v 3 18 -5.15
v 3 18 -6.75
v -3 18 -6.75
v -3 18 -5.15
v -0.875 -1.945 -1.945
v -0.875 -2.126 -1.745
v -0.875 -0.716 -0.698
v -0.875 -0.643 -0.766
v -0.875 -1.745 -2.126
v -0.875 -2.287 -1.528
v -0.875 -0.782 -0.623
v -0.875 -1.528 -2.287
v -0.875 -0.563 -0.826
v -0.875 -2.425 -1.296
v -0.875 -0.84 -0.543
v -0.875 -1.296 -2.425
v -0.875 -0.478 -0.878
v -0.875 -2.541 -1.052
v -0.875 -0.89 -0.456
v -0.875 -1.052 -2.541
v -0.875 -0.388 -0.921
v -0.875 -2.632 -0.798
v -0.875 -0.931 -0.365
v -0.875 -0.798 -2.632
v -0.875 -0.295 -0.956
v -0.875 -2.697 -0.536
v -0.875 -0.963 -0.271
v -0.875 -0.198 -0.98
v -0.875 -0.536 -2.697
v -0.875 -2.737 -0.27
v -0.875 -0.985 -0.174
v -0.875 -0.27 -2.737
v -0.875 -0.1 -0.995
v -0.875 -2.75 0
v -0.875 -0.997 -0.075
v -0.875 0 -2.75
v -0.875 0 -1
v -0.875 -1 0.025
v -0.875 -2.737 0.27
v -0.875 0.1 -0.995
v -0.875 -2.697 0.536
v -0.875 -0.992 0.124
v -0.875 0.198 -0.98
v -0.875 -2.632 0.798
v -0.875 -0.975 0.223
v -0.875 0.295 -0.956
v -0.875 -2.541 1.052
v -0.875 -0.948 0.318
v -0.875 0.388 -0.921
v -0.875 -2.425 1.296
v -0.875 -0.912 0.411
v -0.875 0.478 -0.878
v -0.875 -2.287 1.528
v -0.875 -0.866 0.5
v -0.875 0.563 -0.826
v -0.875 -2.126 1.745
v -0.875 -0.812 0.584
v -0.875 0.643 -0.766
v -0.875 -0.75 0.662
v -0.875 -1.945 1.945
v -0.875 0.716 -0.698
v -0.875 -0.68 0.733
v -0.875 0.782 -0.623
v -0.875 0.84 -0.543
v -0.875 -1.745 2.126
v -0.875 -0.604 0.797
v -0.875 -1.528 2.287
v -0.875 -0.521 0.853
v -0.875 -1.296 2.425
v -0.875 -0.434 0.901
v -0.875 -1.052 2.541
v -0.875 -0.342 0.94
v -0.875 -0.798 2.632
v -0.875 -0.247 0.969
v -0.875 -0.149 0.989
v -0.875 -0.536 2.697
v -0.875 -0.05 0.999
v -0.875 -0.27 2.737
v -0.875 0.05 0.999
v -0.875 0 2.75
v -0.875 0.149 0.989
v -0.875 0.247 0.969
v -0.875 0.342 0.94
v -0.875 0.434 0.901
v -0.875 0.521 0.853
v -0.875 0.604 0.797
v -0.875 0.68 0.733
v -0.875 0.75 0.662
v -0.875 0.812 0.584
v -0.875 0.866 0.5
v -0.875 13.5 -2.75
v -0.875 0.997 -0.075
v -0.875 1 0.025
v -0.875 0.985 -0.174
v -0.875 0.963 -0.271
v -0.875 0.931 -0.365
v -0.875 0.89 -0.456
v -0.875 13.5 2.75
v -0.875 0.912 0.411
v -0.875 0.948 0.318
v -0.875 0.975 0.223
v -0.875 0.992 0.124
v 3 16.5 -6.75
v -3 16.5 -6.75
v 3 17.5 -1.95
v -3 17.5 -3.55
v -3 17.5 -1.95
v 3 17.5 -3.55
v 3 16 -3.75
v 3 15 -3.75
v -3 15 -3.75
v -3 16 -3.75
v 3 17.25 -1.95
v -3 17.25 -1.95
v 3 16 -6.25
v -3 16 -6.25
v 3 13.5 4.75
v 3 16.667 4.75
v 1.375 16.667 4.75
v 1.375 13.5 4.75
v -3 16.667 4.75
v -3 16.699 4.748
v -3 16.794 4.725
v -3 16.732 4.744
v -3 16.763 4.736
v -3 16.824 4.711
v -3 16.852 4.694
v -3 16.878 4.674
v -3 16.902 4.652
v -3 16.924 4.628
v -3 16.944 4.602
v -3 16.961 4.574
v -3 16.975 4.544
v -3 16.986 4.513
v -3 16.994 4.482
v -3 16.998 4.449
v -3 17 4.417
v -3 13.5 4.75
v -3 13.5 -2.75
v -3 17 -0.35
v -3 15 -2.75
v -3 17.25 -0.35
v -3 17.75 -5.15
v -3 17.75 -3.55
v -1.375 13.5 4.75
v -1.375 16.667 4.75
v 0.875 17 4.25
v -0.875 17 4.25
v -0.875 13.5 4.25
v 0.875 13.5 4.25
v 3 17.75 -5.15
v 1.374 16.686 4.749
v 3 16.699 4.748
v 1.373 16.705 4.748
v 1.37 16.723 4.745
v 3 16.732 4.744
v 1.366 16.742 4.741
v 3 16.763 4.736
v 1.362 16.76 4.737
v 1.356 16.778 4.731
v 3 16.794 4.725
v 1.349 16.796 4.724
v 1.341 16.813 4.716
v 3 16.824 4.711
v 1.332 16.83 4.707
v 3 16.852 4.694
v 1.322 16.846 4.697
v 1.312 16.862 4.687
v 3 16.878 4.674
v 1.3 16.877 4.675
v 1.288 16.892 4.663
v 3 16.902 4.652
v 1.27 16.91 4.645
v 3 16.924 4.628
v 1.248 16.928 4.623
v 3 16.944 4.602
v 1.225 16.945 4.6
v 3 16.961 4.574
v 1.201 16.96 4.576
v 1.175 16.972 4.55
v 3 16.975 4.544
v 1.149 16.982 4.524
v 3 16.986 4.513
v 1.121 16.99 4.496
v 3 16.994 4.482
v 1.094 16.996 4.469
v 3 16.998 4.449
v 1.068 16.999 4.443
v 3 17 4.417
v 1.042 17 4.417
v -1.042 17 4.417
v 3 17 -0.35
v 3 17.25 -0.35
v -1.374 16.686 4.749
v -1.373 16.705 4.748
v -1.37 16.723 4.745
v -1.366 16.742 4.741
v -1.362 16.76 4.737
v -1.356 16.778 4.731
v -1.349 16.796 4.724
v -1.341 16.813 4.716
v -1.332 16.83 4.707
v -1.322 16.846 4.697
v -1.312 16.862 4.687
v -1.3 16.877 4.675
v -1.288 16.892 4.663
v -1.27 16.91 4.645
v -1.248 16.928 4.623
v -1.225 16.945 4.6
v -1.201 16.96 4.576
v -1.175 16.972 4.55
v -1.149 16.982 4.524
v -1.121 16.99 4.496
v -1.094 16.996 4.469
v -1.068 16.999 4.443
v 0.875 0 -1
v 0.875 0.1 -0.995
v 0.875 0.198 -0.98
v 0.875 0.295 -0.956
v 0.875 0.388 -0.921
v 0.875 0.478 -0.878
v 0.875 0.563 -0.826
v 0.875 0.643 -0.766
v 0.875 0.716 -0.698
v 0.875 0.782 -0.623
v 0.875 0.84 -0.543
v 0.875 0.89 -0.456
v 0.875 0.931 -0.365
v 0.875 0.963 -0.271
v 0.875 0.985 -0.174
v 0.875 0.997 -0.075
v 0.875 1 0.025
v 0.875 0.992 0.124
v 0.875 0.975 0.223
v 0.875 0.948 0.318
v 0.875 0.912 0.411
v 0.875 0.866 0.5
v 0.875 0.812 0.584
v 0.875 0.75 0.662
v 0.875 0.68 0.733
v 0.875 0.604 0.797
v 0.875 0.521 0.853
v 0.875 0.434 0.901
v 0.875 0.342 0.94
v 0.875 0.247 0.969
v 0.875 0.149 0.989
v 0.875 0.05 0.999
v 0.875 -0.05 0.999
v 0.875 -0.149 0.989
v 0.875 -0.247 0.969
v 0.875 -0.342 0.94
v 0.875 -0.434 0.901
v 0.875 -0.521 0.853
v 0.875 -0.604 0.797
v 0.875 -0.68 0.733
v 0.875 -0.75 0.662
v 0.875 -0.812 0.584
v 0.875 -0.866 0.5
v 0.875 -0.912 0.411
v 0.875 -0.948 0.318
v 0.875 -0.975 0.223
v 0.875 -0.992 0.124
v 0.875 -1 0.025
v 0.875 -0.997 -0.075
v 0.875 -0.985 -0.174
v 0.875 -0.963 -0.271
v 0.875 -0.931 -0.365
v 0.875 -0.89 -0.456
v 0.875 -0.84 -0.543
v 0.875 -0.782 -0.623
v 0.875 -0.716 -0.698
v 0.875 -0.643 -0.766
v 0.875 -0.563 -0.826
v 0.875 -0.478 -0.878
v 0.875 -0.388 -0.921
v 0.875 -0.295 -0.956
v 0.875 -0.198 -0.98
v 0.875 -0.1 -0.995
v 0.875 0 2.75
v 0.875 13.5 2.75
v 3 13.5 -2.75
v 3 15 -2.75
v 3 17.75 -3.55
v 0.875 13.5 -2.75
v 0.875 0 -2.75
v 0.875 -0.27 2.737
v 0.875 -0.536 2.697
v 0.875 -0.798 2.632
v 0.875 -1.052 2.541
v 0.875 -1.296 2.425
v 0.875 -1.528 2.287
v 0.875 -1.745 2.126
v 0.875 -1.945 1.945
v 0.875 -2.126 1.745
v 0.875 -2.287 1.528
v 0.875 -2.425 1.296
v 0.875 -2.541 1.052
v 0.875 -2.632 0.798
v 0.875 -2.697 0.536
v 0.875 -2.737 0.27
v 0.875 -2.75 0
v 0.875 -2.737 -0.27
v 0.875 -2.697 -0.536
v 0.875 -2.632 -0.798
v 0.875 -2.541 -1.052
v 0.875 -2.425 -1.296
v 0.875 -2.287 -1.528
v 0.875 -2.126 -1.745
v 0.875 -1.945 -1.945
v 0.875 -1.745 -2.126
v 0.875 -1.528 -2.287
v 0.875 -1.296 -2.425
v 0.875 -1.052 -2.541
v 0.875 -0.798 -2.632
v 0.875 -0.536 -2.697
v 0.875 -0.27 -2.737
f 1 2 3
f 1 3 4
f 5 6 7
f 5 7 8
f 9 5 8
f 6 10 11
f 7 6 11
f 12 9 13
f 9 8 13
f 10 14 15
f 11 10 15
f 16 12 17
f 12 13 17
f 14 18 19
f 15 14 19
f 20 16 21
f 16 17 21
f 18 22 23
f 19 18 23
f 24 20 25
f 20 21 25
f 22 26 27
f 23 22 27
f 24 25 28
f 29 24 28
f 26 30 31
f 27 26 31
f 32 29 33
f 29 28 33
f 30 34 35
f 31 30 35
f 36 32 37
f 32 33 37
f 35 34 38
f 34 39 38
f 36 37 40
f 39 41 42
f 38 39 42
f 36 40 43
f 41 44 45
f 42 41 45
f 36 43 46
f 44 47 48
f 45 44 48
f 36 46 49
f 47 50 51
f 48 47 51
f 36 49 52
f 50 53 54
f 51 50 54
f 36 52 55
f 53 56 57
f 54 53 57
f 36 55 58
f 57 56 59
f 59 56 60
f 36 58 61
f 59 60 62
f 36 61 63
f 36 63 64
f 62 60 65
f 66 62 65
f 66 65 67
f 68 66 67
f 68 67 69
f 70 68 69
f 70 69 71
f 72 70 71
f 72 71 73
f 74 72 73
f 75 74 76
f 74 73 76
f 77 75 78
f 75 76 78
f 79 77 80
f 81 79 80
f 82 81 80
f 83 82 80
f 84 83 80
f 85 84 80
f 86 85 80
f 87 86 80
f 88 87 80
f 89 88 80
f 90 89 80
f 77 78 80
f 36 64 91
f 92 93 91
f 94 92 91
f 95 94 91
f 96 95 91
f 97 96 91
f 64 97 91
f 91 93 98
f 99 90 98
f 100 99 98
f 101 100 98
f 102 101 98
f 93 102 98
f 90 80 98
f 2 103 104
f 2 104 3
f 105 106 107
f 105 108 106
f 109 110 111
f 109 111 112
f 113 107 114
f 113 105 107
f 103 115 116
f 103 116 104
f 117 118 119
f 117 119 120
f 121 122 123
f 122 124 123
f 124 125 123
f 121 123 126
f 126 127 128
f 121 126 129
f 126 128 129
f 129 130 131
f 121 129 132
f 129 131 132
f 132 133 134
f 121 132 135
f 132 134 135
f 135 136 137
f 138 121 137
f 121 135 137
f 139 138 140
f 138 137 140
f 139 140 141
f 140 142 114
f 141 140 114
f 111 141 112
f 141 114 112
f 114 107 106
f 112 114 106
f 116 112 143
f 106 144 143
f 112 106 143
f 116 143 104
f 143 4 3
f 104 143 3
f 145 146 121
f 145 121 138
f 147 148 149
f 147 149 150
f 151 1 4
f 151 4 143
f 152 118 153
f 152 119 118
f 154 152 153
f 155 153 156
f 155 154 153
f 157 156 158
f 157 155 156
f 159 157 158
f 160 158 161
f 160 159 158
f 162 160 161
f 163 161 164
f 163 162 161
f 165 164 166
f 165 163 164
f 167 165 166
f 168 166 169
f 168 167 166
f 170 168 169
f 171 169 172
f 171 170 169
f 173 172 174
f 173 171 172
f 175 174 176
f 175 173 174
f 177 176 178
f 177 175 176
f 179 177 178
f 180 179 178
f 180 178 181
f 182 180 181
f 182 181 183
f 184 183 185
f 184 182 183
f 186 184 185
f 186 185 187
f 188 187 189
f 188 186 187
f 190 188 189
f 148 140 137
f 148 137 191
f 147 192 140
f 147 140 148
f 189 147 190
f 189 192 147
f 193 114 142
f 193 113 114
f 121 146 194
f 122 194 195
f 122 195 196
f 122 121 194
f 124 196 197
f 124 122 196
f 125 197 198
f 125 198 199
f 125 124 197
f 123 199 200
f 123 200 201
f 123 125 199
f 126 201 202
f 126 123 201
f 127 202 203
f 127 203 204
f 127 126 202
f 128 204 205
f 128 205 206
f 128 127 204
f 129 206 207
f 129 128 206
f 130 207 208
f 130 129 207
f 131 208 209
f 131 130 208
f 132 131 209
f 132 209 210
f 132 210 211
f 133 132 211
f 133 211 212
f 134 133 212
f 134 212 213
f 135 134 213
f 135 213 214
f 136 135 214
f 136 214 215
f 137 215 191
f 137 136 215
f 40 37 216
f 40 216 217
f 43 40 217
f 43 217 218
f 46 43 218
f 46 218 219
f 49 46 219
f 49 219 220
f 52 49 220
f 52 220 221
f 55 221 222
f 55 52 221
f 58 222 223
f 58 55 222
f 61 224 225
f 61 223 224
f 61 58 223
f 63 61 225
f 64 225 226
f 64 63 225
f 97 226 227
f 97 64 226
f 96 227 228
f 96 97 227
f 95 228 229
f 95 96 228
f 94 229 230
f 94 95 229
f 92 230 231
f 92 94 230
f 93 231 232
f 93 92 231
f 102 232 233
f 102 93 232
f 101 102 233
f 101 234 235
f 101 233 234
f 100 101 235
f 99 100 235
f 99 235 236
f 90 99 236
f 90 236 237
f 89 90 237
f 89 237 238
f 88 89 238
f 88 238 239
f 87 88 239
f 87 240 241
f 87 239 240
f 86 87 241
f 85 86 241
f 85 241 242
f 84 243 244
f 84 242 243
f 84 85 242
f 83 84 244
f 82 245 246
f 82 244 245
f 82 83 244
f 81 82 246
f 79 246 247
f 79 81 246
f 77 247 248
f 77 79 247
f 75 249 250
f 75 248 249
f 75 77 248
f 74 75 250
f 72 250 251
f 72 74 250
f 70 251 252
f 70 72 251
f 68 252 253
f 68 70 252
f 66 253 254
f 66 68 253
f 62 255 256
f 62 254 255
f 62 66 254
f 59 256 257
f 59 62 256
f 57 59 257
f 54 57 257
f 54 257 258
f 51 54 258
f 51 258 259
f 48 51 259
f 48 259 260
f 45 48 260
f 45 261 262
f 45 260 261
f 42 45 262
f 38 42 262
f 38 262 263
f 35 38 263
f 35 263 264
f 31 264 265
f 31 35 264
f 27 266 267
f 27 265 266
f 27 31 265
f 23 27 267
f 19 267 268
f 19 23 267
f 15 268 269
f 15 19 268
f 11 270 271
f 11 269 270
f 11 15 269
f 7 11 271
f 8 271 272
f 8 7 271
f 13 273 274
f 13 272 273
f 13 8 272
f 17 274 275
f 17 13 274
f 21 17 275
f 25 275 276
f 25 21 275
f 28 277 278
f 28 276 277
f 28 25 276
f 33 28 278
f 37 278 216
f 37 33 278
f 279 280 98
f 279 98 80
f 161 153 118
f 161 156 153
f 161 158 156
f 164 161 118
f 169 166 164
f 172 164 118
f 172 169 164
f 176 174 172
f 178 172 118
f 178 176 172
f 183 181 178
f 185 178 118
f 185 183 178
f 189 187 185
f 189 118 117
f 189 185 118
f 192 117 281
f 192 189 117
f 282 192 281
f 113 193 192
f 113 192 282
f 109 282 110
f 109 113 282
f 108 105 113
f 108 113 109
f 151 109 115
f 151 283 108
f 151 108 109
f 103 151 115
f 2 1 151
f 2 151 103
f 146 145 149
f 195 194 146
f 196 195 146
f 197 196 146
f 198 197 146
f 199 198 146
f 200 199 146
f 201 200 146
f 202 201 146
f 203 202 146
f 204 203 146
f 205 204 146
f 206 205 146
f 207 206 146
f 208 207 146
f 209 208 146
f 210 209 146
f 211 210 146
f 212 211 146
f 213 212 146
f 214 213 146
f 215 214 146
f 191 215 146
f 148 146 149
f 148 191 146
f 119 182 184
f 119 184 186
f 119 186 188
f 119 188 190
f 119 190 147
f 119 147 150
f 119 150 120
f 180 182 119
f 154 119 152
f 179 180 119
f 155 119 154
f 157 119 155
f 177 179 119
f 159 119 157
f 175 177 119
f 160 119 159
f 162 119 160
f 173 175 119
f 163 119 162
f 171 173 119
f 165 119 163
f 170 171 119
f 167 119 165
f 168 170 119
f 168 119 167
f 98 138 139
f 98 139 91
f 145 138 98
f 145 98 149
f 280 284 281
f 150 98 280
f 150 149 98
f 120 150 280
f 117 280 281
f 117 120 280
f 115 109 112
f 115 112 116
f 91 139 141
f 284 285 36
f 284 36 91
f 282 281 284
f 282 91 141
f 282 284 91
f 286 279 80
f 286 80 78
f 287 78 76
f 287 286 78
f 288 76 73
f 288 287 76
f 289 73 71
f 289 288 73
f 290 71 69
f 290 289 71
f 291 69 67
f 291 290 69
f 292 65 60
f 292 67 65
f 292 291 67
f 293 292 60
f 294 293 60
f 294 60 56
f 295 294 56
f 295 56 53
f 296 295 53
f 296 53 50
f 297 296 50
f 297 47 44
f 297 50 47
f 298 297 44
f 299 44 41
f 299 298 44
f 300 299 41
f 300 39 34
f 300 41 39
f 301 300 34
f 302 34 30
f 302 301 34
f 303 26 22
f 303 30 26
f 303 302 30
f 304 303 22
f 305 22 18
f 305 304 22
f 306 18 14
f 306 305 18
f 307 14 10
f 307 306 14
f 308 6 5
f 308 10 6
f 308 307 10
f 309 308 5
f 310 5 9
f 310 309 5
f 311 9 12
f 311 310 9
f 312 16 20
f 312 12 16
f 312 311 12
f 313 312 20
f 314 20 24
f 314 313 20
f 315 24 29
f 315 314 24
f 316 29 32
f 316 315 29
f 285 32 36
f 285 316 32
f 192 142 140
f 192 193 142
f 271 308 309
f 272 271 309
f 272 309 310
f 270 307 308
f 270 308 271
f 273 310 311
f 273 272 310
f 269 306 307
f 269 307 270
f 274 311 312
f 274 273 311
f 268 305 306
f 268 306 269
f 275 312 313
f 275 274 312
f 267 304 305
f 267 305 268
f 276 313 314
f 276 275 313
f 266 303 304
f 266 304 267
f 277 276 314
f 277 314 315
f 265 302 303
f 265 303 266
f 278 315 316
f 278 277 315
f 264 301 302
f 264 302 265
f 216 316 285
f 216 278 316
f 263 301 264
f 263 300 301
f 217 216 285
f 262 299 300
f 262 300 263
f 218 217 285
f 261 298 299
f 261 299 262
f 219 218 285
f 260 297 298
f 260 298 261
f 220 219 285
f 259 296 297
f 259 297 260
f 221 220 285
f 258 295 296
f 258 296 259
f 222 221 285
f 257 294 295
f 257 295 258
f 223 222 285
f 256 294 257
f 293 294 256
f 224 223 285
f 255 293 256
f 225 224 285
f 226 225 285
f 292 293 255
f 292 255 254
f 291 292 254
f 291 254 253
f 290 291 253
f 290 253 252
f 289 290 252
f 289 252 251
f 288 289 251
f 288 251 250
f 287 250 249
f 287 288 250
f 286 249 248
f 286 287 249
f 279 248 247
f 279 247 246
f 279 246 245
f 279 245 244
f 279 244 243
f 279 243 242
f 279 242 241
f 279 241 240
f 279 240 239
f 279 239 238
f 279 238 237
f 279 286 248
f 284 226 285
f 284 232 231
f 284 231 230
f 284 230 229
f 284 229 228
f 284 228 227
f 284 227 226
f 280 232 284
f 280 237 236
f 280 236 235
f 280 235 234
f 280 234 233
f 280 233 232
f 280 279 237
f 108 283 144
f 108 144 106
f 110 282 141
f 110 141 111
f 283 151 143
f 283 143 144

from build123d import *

# Parameters (mm, degrees)
SKETCH1_R           = 1
BOSS_EXTRUDE1_DEPTH = 3
SKETCH2_W           = 2.125
SKETCH2_H           = 16.25
CUT_EXTRUDE1_DEPTH  = 22.56965461
CUT_EXTRUDE2_DEPTH  = 3.5
FILLET1_R           = 0.333333333


with BuildPart() as part:
    # Sketch1 → Boss-Extrude1 (new, symmetric)
    with BuildSketch(Plane(origin=(0, 0, 0), x_dir=(0, 0, -1), z_dir=(1, 0, 0))):
        with BuildLine():
            Line((2.75, 0), (2.75, 15))
            Line((2.75, 15), (3.75, 15))
            Line((3.75, 15), (3.75, 16))
            Line((3.75, 16), (6.25, 16))
            Line((6.25, 16), (6.75, 16.5))
            Line((6.75, 16.5), (6.75, 18))
            Line((6.75, 18), (5.15, 18))
            Line((5.15, 18), (5.15, 17.75))
            Line((5.15, 17.75), (3.55, 17.75))
            Line((3.55, 17.75), (3.55, 17.5))
            Line((3.55, 17.5), (1.95, 17.5))
            Line((1.95, 17.5), (1.95, 17.25))
            Line((1.95, 17.25), (0.35, 17.25))
            Line((0.35, 17.25), (0.35, 17))
            Line((0.35, 17), (-4.75, 17))
            Line((-4.75, 17), (-4.75, 13.5))
            Line((-4.75, 13.5), (-2.75, 13.5))
            Line((-2.75, 13.5), (-2.75, 0))
            ThreePointArc((-2.75, 0), (0, -2.75), (2.75, 0))
        make_face()
        Circle(SKETCH1_R, mode=Mode.SUBTRACT)
    extrude(amount=BOSS_EXTRUDE1_DEPTH, both=True)

    # Sketch2 → Cut-Extrude1 (cut, through all)
    with BuildSketch(Plane.XY.offset(4.75)):
        with Locations((1.9375, 5.375)):
            Rectangle(SKETCH2_W, SKETCH2_H)
        with Locations((-1.9375, 5.375)):
            Rectangle(SKETCH2_W, SKETCH2_H)
    extrude(amount=-CUT_EXTRUDE1_DEPTH, mode=Mode.SUBTRACT)

    # Sketch3 → Cut-Extrude2 (cut)
    with BuildSketch(Plane(origin=(0, 17, 0), x_dir=(1, 0, 0), z_dir=(0, 1, 0))):
        Polygon((-0.875, -4.25), (0.875, -4.25), (1.375, -4.75), (-1.375, -4.75), align=None)
    extrude(amount=-CUT_EXTRUDE2_DEPTH, mode=Mode.SUBTRACT)

    # Fillet1
    fillet1_edges = [part.edges().sort_by_distance(p)[0] for p in [
        (-2.1875, 17, 4.75),
        (2.1875, 17, 4.75),
    ]]
    fillet(fillet1_edges, radius=FILLET1_R)


solid = part.part
